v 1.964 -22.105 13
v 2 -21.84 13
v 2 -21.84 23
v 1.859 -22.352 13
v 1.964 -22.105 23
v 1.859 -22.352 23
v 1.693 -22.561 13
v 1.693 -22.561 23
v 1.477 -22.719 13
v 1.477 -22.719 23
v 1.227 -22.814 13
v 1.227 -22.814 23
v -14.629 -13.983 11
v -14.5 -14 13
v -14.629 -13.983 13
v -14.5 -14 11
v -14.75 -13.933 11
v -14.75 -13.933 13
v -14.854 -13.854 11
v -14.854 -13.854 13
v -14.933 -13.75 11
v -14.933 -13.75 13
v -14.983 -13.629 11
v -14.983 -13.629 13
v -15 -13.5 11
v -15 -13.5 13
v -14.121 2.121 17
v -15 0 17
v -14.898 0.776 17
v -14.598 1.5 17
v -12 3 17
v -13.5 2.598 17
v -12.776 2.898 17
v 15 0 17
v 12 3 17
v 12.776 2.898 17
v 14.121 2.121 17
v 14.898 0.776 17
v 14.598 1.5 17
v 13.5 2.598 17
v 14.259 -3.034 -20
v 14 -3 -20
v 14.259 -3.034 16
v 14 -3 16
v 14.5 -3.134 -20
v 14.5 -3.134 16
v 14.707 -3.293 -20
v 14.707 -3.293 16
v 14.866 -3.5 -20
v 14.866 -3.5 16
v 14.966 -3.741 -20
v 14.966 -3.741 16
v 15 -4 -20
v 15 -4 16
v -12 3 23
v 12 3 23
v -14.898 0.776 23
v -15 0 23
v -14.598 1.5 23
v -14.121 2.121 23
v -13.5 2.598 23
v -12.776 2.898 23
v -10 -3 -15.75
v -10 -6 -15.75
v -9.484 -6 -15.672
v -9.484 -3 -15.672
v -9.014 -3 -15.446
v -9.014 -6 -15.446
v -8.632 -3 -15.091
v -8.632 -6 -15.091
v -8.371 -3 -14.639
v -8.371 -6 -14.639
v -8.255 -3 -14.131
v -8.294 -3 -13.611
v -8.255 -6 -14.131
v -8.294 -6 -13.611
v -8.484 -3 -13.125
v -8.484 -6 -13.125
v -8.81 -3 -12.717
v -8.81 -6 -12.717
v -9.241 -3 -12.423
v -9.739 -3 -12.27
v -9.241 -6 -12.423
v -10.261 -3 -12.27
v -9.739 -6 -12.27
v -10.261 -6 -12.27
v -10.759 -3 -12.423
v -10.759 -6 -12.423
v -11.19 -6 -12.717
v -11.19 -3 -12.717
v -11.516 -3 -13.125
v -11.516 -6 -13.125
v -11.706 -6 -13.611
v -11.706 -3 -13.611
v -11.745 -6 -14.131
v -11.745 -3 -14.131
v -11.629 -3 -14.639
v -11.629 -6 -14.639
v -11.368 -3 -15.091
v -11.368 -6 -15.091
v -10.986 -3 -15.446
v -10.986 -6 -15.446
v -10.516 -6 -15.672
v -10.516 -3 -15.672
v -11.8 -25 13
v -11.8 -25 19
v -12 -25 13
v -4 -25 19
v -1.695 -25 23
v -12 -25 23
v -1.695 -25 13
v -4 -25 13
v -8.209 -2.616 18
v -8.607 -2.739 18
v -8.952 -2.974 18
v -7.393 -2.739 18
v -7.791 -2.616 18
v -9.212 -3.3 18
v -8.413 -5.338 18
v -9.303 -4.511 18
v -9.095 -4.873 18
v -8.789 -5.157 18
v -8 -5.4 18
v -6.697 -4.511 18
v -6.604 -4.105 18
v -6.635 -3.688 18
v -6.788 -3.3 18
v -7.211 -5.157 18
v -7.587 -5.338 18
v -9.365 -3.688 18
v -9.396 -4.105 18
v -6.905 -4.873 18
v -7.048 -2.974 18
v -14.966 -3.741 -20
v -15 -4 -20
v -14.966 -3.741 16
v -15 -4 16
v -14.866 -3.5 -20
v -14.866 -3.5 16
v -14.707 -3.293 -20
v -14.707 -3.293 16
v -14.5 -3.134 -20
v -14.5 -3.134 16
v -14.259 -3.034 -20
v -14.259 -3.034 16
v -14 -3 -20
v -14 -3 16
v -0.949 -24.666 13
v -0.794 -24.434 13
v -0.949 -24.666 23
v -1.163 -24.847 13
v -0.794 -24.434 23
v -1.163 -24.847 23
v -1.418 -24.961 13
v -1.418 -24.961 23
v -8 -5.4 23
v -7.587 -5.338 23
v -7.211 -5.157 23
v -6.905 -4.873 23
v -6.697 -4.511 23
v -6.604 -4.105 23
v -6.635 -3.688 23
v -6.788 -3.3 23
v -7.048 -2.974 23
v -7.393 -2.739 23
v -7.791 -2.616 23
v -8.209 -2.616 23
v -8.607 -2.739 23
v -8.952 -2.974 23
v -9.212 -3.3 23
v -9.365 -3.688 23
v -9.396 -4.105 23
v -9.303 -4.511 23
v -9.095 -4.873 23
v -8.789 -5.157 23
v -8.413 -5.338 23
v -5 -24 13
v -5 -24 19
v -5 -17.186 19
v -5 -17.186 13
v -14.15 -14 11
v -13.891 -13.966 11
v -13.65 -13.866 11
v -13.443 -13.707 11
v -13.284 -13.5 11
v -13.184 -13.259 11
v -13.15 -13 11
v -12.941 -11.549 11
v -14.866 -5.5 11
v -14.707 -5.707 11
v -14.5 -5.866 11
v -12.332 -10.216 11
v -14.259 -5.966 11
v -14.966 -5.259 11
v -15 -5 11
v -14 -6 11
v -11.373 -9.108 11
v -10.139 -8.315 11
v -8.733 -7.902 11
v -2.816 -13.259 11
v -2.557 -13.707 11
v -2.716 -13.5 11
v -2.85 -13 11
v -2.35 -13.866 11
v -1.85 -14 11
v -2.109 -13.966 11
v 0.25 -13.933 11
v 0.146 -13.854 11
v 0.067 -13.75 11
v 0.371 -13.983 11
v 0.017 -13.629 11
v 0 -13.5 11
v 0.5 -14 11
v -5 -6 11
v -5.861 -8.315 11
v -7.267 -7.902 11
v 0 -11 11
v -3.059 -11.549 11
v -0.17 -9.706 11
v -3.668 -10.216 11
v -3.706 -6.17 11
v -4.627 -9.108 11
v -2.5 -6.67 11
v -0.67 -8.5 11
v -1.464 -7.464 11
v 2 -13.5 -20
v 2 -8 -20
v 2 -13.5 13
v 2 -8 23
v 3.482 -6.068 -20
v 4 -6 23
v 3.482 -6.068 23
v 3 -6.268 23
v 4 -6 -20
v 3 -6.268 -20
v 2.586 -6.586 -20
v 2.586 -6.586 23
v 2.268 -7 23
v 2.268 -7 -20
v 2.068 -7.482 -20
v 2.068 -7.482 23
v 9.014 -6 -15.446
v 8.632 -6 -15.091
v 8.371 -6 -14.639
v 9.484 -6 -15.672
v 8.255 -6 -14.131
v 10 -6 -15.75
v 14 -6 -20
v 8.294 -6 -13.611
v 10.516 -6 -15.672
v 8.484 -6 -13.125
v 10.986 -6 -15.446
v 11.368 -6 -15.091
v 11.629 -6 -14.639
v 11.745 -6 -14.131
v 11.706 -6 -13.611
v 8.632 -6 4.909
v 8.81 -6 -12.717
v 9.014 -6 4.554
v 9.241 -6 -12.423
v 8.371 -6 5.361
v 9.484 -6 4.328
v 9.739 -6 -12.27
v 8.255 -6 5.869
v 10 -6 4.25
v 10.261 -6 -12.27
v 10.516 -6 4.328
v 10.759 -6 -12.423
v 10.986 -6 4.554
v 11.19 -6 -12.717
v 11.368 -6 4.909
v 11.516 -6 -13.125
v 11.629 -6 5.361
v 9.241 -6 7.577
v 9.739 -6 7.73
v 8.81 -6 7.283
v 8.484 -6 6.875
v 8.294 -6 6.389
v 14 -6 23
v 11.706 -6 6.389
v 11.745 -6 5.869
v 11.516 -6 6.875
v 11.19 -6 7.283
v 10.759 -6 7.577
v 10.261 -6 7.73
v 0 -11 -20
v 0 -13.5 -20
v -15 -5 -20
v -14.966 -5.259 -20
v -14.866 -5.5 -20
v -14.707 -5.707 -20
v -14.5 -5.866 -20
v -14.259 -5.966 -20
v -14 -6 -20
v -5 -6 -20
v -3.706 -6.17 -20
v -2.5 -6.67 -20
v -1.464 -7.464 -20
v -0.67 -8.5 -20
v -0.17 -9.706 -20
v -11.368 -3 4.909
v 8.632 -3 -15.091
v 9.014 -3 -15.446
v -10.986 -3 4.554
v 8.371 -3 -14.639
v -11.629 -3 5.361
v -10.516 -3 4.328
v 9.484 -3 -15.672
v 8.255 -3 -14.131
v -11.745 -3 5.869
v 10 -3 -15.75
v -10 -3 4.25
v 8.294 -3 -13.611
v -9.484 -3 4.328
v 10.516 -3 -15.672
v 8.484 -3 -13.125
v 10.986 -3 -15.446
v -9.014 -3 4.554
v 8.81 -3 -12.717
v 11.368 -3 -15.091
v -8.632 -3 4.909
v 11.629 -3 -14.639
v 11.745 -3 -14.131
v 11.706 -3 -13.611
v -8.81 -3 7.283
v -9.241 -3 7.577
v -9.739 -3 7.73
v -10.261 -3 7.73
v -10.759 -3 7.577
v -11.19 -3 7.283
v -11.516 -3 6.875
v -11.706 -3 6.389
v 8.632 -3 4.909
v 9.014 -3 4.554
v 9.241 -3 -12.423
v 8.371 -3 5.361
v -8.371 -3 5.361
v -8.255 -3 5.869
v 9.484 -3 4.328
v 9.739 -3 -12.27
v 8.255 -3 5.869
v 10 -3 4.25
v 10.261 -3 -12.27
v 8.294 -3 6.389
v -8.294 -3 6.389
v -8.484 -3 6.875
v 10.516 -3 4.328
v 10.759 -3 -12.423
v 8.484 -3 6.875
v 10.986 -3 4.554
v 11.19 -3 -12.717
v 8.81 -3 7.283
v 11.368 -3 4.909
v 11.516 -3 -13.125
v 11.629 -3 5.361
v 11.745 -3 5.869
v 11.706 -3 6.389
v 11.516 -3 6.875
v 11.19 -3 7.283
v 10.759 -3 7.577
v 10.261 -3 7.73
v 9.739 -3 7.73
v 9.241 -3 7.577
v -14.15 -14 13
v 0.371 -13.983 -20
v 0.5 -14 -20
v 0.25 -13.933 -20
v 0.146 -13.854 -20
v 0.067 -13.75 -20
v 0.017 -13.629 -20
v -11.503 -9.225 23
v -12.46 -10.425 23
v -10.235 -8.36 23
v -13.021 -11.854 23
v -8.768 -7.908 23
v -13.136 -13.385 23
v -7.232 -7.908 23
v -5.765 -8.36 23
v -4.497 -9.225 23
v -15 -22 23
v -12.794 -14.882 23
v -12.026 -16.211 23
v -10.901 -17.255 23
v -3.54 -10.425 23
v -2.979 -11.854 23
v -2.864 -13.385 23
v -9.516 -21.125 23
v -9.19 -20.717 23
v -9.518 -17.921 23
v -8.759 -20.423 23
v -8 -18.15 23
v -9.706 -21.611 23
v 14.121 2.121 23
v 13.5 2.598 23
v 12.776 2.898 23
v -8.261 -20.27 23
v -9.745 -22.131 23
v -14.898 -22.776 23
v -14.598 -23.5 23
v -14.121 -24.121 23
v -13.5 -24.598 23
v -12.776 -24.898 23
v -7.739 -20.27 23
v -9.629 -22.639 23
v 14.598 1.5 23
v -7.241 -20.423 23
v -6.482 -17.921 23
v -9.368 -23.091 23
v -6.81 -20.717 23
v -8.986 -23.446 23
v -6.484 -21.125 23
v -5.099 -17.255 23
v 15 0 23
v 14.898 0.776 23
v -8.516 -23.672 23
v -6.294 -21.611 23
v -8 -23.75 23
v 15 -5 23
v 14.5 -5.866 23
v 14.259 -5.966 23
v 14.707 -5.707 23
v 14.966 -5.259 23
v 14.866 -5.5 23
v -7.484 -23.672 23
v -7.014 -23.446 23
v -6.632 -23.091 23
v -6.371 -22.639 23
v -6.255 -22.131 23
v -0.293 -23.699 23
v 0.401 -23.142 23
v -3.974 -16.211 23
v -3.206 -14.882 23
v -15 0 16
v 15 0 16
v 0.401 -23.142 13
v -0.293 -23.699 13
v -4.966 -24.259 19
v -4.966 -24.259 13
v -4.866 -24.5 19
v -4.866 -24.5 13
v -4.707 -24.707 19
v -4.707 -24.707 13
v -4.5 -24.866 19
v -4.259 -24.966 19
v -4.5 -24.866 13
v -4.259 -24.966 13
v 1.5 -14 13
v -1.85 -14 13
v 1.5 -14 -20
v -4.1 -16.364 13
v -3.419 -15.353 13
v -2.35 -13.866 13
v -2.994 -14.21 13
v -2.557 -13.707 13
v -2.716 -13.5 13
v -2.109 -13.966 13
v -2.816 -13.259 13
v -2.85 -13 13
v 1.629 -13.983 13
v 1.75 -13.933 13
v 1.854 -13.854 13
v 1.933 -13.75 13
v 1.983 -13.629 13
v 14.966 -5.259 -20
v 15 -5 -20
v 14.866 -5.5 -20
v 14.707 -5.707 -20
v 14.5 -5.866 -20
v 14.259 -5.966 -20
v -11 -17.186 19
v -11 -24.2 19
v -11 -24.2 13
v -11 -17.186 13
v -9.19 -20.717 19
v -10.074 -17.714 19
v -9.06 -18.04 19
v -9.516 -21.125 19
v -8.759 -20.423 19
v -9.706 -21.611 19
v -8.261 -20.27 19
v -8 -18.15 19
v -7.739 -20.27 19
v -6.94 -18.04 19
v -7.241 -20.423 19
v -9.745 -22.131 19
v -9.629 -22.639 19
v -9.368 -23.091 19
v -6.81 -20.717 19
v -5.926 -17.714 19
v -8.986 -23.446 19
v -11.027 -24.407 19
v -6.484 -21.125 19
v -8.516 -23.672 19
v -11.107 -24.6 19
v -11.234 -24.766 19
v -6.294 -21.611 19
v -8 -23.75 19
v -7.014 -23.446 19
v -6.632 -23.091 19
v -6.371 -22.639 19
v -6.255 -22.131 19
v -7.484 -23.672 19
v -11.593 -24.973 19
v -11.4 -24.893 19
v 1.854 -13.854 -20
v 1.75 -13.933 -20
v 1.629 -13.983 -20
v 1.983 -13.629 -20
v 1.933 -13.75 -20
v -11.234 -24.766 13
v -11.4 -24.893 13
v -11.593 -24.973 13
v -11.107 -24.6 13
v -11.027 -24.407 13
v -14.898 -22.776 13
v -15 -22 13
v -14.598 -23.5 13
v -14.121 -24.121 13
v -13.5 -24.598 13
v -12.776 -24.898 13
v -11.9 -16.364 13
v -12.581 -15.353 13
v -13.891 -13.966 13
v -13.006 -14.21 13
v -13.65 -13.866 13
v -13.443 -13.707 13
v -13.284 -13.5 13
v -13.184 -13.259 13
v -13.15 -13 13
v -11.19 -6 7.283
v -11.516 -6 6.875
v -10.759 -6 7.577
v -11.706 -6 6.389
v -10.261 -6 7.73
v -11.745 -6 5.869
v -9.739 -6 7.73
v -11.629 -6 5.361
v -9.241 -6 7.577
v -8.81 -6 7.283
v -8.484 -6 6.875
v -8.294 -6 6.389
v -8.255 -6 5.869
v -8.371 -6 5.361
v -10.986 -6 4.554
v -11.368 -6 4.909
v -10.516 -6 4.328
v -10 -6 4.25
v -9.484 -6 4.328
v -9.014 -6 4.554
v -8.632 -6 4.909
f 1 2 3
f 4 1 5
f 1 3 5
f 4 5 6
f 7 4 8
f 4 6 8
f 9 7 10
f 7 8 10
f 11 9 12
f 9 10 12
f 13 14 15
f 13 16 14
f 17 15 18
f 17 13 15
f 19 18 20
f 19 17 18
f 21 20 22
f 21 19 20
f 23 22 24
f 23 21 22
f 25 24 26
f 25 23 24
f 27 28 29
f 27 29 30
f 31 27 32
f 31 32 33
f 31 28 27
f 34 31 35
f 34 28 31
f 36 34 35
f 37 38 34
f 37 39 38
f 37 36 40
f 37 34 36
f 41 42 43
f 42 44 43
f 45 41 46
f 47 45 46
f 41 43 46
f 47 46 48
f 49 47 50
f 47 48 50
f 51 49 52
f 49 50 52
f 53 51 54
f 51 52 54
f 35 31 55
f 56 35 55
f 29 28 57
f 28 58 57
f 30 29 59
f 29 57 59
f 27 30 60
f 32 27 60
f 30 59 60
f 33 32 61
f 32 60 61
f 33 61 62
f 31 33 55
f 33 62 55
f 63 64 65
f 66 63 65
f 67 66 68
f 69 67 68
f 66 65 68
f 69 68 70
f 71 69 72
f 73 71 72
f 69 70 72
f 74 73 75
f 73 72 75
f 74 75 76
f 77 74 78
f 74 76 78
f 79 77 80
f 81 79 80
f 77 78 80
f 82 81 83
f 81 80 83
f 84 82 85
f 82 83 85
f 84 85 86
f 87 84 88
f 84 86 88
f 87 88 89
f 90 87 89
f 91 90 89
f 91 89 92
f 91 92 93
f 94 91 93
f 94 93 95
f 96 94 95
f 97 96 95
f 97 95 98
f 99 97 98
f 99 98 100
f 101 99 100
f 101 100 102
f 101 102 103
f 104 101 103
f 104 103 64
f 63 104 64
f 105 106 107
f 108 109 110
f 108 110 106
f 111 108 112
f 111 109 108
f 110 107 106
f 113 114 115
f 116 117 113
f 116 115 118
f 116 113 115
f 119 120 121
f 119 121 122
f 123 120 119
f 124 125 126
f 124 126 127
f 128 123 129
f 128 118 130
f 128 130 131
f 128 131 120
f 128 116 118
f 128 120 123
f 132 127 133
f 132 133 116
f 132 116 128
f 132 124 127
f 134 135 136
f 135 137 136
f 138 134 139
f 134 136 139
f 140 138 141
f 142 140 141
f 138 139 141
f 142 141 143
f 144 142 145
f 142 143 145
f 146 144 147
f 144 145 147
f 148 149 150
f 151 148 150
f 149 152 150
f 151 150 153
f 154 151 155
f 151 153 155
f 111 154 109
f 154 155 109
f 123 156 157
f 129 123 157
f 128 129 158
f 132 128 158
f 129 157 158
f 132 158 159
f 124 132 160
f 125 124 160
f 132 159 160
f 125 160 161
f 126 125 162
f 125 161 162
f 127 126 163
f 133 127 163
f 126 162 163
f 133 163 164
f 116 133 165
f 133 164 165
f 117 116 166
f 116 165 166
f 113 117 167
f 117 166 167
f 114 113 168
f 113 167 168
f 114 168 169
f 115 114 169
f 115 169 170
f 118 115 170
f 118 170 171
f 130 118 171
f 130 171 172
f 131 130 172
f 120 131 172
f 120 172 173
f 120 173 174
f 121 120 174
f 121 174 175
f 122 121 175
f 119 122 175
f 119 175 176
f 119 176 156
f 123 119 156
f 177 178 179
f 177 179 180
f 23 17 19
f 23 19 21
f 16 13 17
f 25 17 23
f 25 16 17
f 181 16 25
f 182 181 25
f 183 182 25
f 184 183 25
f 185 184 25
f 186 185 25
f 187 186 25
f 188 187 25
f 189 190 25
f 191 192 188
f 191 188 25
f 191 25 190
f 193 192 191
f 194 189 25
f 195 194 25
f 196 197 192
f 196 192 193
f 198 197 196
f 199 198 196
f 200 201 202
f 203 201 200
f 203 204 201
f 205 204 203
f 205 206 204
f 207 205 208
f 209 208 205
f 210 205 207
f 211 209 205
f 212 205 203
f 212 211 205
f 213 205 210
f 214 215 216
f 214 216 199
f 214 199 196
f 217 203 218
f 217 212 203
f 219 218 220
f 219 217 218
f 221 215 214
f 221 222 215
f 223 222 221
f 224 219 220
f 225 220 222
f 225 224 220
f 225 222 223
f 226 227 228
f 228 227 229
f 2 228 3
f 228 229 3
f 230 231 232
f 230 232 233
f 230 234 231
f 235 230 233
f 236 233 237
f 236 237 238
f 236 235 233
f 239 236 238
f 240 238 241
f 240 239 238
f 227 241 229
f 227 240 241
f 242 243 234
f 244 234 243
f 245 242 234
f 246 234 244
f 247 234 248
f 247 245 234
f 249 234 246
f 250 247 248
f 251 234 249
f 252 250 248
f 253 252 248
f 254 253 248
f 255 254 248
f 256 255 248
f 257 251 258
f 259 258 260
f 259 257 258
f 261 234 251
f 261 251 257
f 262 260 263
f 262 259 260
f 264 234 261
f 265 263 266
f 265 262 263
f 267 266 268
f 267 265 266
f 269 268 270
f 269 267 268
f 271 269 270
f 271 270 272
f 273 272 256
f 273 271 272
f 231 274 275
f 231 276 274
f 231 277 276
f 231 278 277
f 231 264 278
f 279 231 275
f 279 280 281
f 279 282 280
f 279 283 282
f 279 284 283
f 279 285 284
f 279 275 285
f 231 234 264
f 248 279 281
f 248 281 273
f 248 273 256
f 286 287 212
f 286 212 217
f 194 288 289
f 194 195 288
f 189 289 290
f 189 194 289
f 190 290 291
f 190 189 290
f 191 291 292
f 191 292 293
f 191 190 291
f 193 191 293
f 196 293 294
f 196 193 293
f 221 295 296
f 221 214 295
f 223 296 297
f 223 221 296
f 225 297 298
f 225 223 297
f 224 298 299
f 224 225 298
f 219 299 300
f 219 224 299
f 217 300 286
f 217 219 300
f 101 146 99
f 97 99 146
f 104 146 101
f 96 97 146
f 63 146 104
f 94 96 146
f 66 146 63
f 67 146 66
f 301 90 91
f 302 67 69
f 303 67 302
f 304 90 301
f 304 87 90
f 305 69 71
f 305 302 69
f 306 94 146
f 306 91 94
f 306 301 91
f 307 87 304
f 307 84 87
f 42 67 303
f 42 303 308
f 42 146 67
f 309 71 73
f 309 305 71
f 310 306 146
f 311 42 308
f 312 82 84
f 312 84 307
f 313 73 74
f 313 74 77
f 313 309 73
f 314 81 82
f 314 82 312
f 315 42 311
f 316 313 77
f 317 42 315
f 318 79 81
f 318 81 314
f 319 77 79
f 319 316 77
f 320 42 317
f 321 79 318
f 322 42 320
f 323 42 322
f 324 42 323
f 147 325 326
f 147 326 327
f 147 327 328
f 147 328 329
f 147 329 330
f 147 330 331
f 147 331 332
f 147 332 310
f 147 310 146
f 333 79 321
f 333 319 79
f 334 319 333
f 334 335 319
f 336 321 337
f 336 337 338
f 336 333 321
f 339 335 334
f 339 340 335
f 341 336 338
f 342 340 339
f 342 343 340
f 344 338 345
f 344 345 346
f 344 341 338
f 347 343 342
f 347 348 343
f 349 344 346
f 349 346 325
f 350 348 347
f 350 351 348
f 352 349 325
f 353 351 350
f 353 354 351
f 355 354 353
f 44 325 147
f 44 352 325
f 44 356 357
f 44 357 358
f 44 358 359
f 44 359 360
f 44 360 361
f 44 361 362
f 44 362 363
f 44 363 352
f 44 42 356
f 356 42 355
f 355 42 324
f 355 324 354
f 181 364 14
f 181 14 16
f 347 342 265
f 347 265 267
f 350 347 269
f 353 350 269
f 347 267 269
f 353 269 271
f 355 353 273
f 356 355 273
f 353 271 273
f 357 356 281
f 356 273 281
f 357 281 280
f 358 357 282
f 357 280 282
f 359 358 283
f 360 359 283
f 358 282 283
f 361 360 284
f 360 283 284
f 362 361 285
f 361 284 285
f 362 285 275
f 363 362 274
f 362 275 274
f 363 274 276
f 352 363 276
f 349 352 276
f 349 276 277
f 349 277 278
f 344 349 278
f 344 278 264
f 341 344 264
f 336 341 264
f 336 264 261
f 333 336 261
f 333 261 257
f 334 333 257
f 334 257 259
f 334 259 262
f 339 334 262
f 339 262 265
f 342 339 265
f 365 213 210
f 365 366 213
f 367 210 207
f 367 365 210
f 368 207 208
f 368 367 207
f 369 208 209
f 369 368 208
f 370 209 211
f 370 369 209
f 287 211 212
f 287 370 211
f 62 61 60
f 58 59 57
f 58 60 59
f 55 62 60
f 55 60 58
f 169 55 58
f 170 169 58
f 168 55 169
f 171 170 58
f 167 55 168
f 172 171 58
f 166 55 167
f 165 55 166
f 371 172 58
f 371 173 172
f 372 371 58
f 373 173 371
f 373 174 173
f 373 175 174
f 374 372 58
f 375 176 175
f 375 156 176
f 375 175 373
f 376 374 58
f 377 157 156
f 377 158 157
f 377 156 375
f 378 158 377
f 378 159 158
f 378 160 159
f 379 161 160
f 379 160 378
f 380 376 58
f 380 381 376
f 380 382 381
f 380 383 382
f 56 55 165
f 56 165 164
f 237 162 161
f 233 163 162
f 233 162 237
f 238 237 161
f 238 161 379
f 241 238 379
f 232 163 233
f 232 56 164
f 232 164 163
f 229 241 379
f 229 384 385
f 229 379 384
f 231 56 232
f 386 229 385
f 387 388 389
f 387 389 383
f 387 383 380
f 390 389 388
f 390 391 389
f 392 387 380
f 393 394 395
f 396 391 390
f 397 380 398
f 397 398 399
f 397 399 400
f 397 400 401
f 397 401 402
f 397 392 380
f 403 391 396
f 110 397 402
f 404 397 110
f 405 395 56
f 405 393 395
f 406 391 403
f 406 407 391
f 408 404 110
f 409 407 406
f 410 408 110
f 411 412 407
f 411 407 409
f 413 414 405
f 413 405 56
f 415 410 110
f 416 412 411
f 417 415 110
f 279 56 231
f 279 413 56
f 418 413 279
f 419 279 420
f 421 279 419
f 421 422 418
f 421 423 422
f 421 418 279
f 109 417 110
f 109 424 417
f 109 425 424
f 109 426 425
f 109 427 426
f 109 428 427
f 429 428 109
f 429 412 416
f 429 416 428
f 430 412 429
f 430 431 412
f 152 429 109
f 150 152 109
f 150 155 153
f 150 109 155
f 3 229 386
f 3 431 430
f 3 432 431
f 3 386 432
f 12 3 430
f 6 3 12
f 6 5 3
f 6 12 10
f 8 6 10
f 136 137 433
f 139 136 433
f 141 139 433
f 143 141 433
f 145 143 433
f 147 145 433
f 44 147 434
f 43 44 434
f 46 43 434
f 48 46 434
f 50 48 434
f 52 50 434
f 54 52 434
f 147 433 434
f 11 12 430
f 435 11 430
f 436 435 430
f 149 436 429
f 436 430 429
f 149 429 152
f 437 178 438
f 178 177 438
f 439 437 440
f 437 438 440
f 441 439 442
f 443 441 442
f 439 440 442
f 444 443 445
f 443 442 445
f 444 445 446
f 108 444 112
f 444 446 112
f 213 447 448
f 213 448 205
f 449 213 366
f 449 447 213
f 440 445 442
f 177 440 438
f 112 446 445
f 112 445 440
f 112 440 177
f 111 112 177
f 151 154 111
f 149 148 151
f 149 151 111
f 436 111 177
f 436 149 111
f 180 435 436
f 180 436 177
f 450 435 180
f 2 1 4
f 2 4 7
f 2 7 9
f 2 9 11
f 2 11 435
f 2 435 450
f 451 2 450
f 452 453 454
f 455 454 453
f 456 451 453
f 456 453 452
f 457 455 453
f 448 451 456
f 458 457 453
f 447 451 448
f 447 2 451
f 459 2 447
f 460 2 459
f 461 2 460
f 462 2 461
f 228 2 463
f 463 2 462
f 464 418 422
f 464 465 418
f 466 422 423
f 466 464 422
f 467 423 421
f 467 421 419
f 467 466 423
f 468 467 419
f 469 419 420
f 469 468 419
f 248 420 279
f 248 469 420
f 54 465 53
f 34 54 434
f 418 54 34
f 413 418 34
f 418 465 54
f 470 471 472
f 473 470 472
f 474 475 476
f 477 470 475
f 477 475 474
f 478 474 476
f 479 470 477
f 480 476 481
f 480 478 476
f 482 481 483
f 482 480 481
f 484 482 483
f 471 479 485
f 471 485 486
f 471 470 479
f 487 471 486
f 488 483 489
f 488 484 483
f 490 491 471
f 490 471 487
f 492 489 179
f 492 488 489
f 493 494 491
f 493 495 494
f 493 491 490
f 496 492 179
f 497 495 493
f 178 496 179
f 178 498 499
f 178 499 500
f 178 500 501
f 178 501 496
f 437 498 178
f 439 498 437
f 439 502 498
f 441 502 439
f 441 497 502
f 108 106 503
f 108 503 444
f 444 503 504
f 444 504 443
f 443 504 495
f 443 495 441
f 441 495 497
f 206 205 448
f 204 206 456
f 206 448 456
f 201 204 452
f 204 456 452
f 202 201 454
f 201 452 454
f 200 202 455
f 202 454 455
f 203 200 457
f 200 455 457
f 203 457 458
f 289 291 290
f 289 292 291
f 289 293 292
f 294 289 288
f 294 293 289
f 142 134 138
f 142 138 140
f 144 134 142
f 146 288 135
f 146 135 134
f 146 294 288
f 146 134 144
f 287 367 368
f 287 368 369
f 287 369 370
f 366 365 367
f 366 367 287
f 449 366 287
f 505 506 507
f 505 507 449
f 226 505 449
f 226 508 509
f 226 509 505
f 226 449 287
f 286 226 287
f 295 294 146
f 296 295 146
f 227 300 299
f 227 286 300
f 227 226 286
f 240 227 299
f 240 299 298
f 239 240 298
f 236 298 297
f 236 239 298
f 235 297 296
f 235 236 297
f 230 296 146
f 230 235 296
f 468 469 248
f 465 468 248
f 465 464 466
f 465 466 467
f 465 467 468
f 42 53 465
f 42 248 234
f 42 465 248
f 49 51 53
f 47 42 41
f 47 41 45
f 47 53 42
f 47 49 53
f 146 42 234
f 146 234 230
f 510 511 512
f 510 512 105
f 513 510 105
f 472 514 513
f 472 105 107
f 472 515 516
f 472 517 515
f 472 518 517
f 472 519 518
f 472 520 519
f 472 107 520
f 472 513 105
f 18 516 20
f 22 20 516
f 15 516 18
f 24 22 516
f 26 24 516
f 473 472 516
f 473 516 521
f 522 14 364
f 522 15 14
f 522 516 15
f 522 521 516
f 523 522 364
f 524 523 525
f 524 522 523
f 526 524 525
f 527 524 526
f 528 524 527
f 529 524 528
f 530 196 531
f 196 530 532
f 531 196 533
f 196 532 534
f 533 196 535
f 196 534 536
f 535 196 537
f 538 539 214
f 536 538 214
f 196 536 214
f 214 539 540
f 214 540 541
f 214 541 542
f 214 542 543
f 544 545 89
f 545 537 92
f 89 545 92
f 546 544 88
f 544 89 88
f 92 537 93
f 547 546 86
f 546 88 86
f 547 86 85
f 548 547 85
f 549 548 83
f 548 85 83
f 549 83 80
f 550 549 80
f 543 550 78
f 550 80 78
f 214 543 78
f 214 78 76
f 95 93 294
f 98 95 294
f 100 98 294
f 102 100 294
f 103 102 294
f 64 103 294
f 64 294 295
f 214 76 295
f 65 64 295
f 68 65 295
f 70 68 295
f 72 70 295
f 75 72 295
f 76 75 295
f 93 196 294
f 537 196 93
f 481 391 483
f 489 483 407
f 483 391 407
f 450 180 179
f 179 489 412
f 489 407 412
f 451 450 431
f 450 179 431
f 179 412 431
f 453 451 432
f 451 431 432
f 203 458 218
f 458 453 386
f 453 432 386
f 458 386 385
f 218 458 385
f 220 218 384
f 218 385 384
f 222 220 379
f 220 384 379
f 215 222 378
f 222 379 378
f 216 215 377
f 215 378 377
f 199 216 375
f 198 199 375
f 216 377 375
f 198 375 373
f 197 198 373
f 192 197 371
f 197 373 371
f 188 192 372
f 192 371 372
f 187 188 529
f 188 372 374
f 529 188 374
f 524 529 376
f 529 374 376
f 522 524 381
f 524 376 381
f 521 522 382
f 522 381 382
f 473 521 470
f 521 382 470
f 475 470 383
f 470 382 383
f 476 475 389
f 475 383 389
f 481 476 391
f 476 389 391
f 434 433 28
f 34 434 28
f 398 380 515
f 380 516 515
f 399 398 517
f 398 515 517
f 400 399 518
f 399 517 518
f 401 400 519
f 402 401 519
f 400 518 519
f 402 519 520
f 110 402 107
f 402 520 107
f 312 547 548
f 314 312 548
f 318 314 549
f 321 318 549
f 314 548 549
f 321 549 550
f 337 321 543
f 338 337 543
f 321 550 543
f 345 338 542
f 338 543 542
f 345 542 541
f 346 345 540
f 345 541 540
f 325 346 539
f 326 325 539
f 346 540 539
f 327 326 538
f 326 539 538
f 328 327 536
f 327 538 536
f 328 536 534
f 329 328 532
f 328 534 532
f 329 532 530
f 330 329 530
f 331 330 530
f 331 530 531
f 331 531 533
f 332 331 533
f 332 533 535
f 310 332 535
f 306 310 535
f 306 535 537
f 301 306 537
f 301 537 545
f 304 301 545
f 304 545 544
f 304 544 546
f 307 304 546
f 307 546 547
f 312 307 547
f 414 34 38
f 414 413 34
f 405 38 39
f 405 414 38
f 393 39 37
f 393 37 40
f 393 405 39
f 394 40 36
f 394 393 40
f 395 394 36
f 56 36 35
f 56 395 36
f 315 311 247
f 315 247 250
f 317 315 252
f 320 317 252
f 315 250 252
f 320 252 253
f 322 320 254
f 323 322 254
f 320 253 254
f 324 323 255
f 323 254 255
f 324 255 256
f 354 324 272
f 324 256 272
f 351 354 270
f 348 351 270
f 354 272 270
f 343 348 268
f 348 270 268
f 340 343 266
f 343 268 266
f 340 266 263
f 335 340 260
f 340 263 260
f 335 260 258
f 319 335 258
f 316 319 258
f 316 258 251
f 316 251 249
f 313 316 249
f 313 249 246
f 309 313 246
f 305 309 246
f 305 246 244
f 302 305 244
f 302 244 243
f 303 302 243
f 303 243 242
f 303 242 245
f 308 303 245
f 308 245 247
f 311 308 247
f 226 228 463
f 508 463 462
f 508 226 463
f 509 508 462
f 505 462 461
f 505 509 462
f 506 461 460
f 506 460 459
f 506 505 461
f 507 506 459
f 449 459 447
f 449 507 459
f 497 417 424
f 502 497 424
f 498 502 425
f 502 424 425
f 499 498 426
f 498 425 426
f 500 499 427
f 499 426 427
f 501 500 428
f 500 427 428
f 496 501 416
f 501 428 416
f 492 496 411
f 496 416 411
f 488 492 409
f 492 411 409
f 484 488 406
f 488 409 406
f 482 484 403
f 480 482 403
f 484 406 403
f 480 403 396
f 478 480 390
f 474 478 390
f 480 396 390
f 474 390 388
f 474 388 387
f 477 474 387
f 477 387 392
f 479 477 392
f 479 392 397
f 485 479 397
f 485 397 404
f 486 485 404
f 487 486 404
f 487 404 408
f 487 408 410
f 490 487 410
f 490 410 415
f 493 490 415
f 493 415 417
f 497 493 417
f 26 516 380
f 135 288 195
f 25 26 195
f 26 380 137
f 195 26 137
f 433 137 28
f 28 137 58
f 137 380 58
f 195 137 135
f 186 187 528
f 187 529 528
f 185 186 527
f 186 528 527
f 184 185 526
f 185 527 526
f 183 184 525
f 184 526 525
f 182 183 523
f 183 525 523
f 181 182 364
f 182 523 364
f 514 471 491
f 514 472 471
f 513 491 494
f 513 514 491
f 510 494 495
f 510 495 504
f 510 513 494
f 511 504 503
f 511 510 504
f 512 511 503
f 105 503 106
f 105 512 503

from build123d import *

# Parameters (mm, degrees)
PAD001_DEPTH      = 15
PAD001_DEPTH_BACK = 15
SKETCH014_W       = 8
SKETCH014_H       = 6
POCKET_DEPTH      = 11
SKETCH013_R       = 1.4
SKETCH013_R_2     = 1.75
POCKET001_DEPTH   = 17
SKETCH012_R       = 5.15
POCKET002_DEPTH   = 43.001
SKETCH007_R       = 1.75
POCKET003_DEPTH   = 17.001
SKETCH008_W       = 8.907674
SKETCH008_H       = 16
SKETCH008_W_2     = 9.43002
SKETCH008_H_2     = 13.41794
POCKET004_DEPTH   = 31
SKETCH018_R       = 3
POCKET005_DEPTH   = 55.001
SKETCH021_W       = 22.157055
SKETCH021_H       = 18.106247
POCKET006_DEPTH   = 44
SKETCH015_W       = 50.47
SKETCH015_H       = 40
POCKET007_DEPTH   = 3
FILLET_R          = 3
FILLET001_R       = 1
FILLET002_R       = 2
FILLET003_R       = 1
FILLET004_R       = 1
FILLET005_R       = 1
FILLET006_R       = 1
FILLET007_R       = 5
FILLET008_R       = 1
FILLET009_R       = 0.8
FILLET010_R       = 0.5
FILLET011_R       = 0.5
FILLET012_R       = 0.5
FILLET013_R       = 1


with BuildPart() as part:
    # Sketch005 → Pad001 (new body, two sides)
    with BuildSketch(Plane.YZ) as pad001_sk:
        Polygon((0, -20), (0, 17), (3, 17), (3, 23), (-25, 23), (-25, 13), (-14, 13), (-14, -20), align=None)
    extrude(amount=PAD001_DEPTH)
    extrude(pad001_sk.sketch, amount=-PAD001_DEPTH_BACK)

    # Sketch014 (on Face5 of Pad001) → Pocket (cut)
    with BuildSketch(Plane(origin=(0, -25, 0), x_dir=(0, 0, -1), z_dir=(0, -1, 0))):
        with Locations((-15, -8)):
            Rectangle(SKETCH014_W, SKETCH014_H)
    extrude(amount=-POCKET_DEPTH, mode=Mode.SUBTRACT)

    # Sketch013 → Pocket001 (cut)
    with BuildSketch(Plane(origin=(0, 0, 35), x_dir=(0, -1, 0), z_dir=(0, 0, 1))):
        with Locations((4, -8)):
            Circle(SKETCH013_R)
        with Locations((22, -8)):
            Circle(SKETCH013_R_2)
    extrude(amount=-POCKET001_DEPTH, mode=Mode.SUBTRACT)

    # Sketch012 (on Face4 of Pad001) → Pocket002 (cut, through all)
    with BuildSketch(Plane(origin=(0, 0, 23), x_dir=(0, -1, 0), z_dir=(0, 0, 1))):
        with Locations((13, -8)):
            Circle(SKETCH012_R)
    extrude(amount=-POCKET002_DEPTH, mode=Mode.SUBTRACT)

    # Sketch007 → Pocket003 (cut, through all)
    with BuildSketch(Plane(origin=(0, -14, 0), x_dir=(0, 0, -1), z_dir=(0, -1, 0))):
        with Locations((-6, 10)):
            Circle(SKETCH007_R)
        with Locations((14, 10)):
            Circle(SKETCH007_R)
        with Locations((-6, -10)):
            Circle(SKETCH007_R)
        with Locations((14, -10)):
            Circle(SKETCH007_R)
    extrude(amount=-POCKET003_DEPTH, mode=Mode.SUBTRACT)

    # Sketch008 → Pocket004 (cut)
    with BuildSketch(Plane.YX.offset(20)):
        with Locations((-10.453837, -8)):
            Rectangle(SKETCH008_W, SKETCH008_H)
        with Locations((-10.71501, 10.872729)):
            Rectangle(SKETCH008_W_2, SKETCH008_H_2)
    extrude(amount=-POCKET004_DEPTH, mode=Mode.SUBTRACT)

    # Sketch018 → Pocket005 (cut, through all)
    with BuildSketch(Plane(origin=(0, 0, 35), x_dir=(0, -1, 0), z_dir=(0, 0, 1))):
        with Locations((25.735598, 1.909207)):
            Circle(SKETCH018_R)
    extrude(amount=-POCKET005_DEPTH, mode=Mode.SUBTRACT)

    # Sketch021 → Pocket006 (cut)
    with BuildSketch(Plane(origin=(0, 0, 23), x_dir=(0, -1, 0), z_dir=(0, 0, 1))):
        with Locations((17.078527, 11.053123)):
            Rectangle(SKETCH021_W, SKETCH021_H)
    extrude(amount=-POCKET006_DEPTH, mode=Mode.SUBTRACT)

    # Sketch015 → Pocket007 (cut)
    with BuildSketch(Plane.ZX):
        with Locations((-9.235, 0)):
            Rectangle(SKETCH015_W, SKETCH015_H)
    extrude(amount=-POCKET007_DEPTH, mode=Mode.SUBTRACT)

    # Fillet
    fillet_edges = [part.edges().sort_by_distance(p)[0] for p in [
        (-15, 3, 20),
        (-15, -25, 18),
        (15, 3, 20),
    ]]
    fillet(fillet_edges, radius=FILLET_R)

    # Fillet001
    fillet001_edges = [part.edges().sort_by_distance(p)[0] for p in [
        (15, -6, 17),
    ]]
    fillet(fillet001_edges, radius=FILLET001_R)

    # Fillet002
    fillet002_edges = [part.edges().sort_by_distance(p)[0] for p in [
        (2, -6, 1.5),
    ]]
    fillet(fillet002_edges, radius=FILLET002_R)

    # Fillet003
    fillet003_edges = [part.edges().sort_by_distance(p)[0] for p in [
        (2, -22.736972, 18),
        (-0.999211, -25, 18),
    ]]
    fillet(fillet003_edges, radius=FILLET003_R)

    # Fillet004
    fillet004_edges = [part.edges().sort_by_distance(p)[0] for p in [
        (-15, -6, -4.5),
    ]]
    fillet(fillet004_edges, radius=FILLET004_R)

    # Fillet005
    fillet005_edges = [part.edges().sort_by_distance(p)[0] for p in [
        (-15, -3, -2),
    ]]
    fillet(fillet005_edges, radius=FILLET005_R)

    # Fillet006
    fillet006_edges = [part.edges().sort_by_distance(p)[0] for p in [
        (15, -3, -2),
    ]]
    fillet(fillet006_edges, radius=FILLET006_R)

    # Fillet007
    fillet007_edges = [part.edges().sort_by_distance(p)[0] for p in [
        (0, -6, -4.5),
    ]]
    fillet(fillet007_edges, radius=FILLET007_R)

    # Fillet008
    fillet008_edges = [part.edges().sort_by_distance(p)[0] for p in [
        (-5, -25, 16),
    ]]
    fillet(fillet008_edges, radius=FILLET008_R)

    # Fillet009
    fillet009_edges = [part.edges().sort_by_distance(p)[0] for p in [
        (-11, -25, 16),
    ]]
    fillet(fillet009_edges, radius=FILLET009_R)

    # Fillet010
    fillet010_edges = [part.edges().sort_by_distance(p)[0] for p in [
        (0, -14, -4.5),
    ]]
    fillet(fillet010_edges, radius=FILLET010_R)

    # Fillet011
    fillet011_edges = [part.edges().sort_by_distance(p)[0] for p in [
        (2, -14, -3.5),
    ]]
    fillet(fillet011_edges, radius=FILLET011_R)

    # Fillet012
    fillet012_edges = [part.edges().sort_by_distance(p)[0] for p in [
        (-15, -14, 12),
    ]]
    fillet(fillet012_edges, radius=FILLET012_R)

    # Fillet013
    fillet013_edges = [part.edges().sort_by_distance(p)[0] for p in [
        (-13.05198, -14, 12),
        (-2.94802, -14, 12),
    ]]
    fillet(fillet013_edges, radius=FILLET013_R)


solid = part.part
